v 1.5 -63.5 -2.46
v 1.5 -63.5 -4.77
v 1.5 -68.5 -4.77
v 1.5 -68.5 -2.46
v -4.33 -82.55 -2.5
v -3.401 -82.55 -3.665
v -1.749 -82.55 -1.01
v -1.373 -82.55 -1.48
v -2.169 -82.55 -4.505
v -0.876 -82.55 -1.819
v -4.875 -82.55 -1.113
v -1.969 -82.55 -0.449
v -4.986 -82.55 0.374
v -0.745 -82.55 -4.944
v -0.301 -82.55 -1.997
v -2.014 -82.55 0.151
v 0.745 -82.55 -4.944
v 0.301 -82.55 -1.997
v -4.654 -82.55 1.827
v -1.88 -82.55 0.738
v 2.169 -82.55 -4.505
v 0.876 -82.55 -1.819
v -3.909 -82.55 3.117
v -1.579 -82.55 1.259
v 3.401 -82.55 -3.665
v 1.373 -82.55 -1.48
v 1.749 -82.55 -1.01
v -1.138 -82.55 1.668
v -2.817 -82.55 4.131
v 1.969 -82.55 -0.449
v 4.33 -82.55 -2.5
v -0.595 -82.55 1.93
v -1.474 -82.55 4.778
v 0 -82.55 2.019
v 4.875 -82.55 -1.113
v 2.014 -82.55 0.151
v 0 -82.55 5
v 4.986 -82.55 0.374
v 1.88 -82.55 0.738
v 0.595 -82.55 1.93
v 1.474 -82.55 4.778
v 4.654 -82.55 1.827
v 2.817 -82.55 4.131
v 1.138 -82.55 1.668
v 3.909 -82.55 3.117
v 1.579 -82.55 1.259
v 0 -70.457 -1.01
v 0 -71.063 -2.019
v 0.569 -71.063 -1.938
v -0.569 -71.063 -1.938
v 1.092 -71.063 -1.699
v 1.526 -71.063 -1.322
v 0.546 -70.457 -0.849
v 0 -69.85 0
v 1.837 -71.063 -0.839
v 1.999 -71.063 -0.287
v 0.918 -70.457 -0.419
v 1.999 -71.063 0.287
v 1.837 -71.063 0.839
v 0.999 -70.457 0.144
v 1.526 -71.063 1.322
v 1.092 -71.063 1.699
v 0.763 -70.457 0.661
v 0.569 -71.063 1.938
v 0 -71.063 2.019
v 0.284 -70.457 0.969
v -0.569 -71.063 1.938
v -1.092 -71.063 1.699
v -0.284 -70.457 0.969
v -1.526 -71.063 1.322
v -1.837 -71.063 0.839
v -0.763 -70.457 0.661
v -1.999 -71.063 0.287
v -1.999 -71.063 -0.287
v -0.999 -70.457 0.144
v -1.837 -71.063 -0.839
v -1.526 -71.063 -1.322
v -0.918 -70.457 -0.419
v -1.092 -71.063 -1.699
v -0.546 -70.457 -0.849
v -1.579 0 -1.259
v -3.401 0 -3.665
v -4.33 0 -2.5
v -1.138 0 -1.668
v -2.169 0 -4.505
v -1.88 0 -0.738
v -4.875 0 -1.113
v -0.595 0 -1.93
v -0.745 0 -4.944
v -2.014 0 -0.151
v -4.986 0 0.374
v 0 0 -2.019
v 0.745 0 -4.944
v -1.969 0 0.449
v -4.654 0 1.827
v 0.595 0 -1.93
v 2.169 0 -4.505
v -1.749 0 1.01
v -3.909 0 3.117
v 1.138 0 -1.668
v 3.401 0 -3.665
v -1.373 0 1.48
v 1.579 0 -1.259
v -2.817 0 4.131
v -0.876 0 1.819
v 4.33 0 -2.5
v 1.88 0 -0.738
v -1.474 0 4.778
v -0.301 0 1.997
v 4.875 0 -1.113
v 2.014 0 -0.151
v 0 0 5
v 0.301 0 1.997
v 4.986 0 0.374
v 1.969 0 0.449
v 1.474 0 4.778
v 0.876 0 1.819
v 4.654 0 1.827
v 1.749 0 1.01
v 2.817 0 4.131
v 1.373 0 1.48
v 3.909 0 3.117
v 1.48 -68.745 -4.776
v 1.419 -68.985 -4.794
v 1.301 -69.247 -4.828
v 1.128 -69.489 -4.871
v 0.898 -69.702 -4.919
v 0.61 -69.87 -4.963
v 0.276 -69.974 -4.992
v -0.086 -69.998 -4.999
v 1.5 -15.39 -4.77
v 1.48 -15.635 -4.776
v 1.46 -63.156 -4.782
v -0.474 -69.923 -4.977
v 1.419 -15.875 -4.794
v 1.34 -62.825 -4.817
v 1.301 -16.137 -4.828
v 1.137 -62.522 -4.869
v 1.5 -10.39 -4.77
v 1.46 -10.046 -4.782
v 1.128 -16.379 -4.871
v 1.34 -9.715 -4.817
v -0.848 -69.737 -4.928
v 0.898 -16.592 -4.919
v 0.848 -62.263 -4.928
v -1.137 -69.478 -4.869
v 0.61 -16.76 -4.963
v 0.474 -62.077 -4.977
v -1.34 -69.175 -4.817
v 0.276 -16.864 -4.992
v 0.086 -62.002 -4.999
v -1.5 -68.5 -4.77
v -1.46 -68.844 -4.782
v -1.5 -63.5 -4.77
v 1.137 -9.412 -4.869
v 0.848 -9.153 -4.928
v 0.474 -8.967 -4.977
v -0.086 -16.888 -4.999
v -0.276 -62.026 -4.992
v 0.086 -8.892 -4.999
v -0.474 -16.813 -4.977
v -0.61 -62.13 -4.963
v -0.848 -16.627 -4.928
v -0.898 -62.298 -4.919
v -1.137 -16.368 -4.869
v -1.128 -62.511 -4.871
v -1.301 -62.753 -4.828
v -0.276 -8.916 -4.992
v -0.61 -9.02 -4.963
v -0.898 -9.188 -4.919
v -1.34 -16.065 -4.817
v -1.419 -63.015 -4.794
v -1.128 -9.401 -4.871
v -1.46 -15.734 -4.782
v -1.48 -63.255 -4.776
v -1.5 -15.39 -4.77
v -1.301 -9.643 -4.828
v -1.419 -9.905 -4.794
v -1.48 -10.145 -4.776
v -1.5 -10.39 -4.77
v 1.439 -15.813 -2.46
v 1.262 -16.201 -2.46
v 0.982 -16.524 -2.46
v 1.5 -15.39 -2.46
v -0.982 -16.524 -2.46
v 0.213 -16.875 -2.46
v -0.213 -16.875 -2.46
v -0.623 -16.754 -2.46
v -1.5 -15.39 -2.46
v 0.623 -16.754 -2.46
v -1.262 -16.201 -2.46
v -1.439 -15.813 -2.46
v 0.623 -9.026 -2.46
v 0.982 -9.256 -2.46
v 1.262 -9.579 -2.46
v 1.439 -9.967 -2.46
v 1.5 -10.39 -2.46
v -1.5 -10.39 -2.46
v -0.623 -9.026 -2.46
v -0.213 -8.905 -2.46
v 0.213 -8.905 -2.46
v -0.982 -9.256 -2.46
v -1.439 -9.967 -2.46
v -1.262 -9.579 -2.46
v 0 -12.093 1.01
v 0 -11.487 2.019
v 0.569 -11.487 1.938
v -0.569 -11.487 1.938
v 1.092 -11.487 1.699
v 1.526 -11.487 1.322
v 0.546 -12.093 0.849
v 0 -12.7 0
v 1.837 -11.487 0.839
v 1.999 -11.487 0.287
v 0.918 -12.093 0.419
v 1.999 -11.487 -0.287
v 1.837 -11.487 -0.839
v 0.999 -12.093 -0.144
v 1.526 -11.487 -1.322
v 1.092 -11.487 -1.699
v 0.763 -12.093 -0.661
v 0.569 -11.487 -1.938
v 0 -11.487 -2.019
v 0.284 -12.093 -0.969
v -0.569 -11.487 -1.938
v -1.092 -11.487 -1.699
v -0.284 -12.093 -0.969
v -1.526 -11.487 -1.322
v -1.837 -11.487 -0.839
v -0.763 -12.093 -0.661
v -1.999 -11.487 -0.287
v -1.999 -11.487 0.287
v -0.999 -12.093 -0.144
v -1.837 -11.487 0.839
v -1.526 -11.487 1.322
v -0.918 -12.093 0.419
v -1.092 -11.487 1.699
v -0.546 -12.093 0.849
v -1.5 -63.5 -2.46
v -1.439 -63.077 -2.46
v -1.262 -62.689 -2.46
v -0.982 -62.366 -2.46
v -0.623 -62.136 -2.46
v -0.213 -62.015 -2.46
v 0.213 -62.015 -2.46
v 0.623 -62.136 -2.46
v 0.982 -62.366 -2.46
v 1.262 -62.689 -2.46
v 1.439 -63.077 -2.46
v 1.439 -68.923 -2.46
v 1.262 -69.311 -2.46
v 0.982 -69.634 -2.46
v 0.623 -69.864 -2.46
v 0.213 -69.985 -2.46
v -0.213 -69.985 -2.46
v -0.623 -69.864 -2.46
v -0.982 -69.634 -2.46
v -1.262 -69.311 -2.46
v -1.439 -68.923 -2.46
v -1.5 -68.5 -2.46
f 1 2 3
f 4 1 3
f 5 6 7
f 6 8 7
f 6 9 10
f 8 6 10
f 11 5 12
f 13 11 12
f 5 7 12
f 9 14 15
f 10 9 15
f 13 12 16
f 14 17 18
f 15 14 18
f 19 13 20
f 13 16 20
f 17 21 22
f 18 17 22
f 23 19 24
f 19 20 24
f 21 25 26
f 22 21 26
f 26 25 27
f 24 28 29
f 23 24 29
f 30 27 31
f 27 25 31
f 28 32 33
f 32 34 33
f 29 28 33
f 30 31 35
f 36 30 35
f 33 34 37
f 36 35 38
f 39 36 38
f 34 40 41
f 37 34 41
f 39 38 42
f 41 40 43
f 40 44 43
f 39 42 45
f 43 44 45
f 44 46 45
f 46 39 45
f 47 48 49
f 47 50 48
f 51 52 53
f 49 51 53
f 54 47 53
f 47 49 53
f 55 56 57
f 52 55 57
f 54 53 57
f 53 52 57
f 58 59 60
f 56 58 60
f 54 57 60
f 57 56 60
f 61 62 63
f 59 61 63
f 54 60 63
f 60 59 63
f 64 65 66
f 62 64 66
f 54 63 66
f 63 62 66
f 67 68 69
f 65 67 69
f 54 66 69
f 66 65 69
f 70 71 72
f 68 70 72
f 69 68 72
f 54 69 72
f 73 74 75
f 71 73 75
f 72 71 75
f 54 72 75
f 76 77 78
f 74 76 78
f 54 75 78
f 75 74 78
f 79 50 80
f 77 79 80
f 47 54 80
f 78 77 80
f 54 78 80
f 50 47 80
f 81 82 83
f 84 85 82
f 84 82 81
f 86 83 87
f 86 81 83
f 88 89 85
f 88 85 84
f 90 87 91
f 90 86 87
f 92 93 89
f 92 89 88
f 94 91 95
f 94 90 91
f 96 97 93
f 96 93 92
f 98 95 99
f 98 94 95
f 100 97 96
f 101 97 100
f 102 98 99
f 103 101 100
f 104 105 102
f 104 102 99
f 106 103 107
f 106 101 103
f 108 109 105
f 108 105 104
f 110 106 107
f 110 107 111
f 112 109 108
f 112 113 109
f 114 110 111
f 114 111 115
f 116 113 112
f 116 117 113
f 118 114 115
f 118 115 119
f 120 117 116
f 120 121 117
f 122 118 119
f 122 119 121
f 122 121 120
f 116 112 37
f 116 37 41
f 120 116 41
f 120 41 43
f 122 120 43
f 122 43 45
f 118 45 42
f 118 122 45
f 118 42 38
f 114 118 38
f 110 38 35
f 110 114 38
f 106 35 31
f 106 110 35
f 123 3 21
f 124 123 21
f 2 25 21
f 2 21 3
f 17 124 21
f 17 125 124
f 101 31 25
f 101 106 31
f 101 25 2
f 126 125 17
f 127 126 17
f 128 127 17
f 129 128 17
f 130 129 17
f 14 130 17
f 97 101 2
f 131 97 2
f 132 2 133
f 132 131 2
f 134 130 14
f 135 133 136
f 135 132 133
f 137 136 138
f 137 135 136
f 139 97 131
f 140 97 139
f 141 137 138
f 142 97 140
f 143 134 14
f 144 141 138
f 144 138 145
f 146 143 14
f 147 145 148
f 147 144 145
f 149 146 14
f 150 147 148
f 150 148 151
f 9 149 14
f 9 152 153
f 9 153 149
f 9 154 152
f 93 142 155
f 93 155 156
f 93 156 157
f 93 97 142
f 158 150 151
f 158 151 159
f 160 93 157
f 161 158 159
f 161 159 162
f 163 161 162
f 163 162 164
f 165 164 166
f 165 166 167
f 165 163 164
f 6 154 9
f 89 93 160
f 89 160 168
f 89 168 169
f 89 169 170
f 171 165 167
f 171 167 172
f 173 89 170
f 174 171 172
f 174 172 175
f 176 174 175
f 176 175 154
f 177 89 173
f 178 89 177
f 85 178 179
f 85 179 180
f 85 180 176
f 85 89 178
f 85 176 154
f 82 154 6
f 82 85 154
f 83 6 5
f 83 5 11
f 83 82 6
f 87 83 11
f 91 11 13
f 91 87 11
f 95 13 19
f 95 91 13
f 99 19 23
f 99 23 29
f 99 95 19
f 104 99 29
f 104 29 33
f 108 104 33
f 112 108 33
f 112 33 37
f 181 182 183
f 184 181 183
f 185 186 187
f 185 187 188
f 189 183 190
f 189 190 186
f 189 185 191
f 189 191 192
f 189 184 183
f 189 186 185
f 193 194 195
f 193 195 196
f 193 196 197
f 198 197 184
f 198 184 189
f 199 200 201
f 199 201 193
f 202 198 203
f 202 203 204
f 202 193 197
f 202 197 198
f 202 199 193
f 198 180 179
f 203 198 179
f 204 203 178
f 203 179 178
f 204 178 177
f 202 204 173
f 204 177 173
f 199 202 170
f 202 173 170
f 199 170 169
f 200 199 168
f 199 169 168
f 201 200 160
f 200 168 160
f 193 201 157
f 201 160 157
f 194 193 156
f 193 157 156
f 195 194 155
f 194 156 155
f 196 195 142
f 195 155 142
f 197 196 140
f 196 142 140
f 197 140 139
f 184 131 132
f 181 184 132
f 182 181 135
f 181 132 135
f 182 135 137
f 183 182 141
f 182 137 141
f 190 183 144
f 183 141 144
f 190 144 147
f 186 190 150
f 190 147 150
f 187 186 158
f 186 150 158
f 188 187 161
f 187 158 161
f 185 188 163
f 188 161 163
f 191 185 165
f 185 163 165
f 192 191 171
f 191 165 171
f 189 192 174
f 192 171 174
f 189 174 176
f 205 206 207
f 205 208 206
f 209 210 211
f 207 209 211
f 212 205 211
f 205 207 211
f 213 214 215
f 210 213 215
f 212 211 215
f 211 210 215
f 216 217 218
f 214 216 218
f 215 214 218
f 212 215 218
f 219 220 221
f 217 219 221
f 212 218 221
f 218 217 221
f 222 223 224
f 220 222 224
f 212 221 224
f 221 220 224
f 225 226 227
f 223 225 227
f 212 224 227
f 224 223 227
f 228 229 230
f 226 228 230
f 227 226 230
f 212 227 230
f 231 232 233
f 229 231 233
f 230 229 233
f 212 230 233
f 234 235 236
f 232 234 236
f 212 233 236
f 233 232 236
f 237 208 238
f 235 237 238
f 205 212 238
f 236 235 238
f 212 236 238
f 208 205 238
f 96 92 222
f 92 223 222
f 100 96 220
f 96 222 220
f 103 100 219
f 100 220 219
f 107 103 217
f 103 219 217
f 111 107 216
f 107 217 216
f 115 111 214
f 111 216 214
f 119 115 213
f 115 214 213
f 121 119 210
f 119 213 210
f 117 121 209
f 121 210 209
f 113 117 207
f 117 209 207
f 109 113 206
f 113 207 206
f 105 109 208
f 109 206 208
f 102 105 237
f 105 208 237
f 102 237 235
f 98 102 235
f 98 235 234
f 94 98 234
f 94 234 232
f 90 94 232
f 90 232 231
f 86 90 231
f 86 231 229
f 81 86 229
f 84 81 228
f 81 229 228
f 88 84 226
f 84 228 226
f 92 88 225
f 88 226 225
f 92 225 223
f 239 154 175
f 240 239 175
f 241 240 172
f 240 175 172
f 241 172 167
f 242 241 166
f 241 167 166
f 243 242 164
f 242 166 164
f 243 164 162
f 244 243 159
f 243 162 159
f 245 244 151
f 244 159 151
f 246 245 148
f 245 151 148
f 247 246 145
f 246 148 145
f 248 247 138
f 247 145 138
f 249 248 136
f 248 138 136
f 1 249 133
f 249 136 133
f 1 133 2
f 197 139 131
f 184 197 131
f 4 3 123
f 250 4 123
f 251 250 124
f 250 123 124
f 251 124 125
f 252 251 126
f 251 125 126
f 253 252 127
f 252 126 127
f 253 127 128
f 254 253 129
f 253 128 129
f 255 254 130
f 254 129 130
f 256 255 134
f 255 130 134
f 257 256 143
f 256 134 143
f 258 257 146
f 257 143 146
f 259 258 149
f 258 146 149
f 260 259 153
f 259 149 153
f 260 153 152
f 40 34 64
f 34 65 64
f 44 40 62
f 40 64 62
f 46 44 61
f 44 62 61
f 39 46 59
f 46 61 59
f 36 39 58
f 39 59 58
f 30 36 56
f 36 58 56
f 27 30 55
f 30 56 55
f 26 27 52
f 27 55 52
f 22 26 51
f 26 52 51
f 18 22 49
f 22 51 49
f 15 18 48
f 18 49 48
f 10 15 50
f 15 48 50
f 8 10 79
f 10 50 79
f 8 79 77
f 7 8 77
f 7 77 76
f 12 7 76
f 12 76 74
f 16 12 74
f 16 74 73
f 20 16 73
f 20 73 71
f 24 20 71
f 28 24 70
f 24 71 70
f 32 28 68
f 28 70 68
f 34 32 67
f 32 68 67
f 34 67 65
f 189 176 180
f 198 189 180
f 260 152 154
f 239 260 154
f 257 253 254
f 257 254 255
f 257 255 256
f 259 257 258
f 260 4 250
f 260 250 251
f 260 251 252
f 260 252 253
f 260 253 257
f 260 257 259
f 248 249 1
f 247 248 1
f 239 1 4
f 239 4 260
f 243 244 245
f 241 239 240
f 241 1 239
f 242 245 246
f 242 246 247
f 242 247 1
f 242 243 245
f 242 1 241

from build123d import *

# Parameters (mm, degrees)
SKETCH1_R                                = 5
BOSS_EXTRUDE2_DEPTH                      = 82.55
CUT_EXTRUDE1_DEPTH                       = 2.54
TAP_DRILL_FOR_10_32_TAP1_D               = 4.0386
TAP_DRILL_FOR_10_32_TAP1_DEPTH           = 11.486682152
TAP_DRILL_FOR_10_32_TAP1_TIP             = 1.213317848
TAP_DRILL_FOR_10_32_TAP1_ON_FACE_2_D     = 4.0386
TAP_DRILL_FOR_10_32_TAP1_ON_FACE_2_DEPTH = 11.486682152
TAP_DRILL_FOR_10_32_TAP1_ON_FACE_2_TIP   = 1.213317848


with BuildPart() as part:
    # Sketch1 → Boss-Extrude2 (new body)
    with BuildSketch(Plane(origin=(0, 0, 0), x_dir=(1, 0, 0), z_dir=(0, 1, 0))):
        with Locations(Location((0, 0, 0), (0, 0, 270))):
            Circle(SKETCH1_R)
    extrude(amount=-BOSS_EXTRUDE2_DEPTH)

    # Sketch2 → Cut-Extrude1 (cut)
    with BuildSketch(Plane(origin=(0, 0, -5), x_dir=(-1, 0, 0), z_dir=(0, 0, -1))):
        with BuildLine():
            Line((-2, -109.22), (-2, -114.22))
            ThreePointArc((-2, -114.22), (0, -116.22), (2, -114.22))
            Line((2, -114.22), (2, -109.22))
            ThreePointArc((2, -109.22), (0, -107.22), (-2, -109.22))
        make_face()
        with BuildLine():
            Line((-1.5, -63.5), (-1.5, -68.5))
            ThreePointArc((-1.5, -68.5), (0, -70), (1.5, -68.5))
            Line((1.5, -68.5), (1.5, -63.5))
            ThreePointArc((1.5, -63.5), (0, -62), (-1.5, -63.5))
        make_face()
        with BuildLine():
            Line((-1.5, -10.39), (-1.5, -15.39))
            ThreePointArc((-1.5, -15.39), (0, -16.89), (1.5, -15.39))
            Line((1.5, -15.39), (1.5, -10.39))
            ThreePointArc((1.5, -10.39), (0, -8.89), (-1.5, -10.39))
        make_face()
    extrude(amount=-CUT_EXTRUDE1_DEPTH, mode=Mode.SUBTRACT)

    # Tap Drill for #10-32 Tap1
    with Locations(Plane.ZX):
        with Locations((0, 0)):
            Hole(TAP_DRILL_FOR_10_32_TAP1_D / 2, depth=TAP_DRILL_FOR_10_32_TAP1_DEPTH)
            with Locations((0, 0, -(TAP_DRILL_FOR_10_32_TAP1_DEPTH + TAP_DRILL_FOR_10_32_TAP1_TIP / 2))):  # 118° drill point
                Cone(0, TAP_DRILL_FOR_10_32_TAP1_D / 2, TAP_DRILL_FOR_10_32_TAP1_TIP, mode=Mode.SUBTRACT)

    # Tap Drill for #10-32 Tap1 on face 2
    with Locations(Plane(origin=(0, -82.55, 0), x_dir=(0, 0, -1), z_dir=(0, -1, 0))):
        with Locations((0, 0)):
            Hole(TAP_DRILL_FOR_10_32_TAP1_ON_FACE_2_D / 2, depth=TAP_DRILL_FOR_10_32_TAP1_ON_FACE_2_DEPTH)
            with Locations((0, 0, -(TAP_DRILL_FOR_10_32_TAP1_ON_FACE_2_DEPTH + TAP_DRILL_FOR_10_32_TAP1_ON_FACE_2_TIP / 2))):  # 118° drill point
                Cone(0, TAP_DRILL_FOR_10_32_TAP1_ON_FACE_2_D / 2, TAP_DRILL_FOR_10_32_TAP1_ON_FACE_2_TIP, mode=Mode.SUBTRACT)


solid = part.part
